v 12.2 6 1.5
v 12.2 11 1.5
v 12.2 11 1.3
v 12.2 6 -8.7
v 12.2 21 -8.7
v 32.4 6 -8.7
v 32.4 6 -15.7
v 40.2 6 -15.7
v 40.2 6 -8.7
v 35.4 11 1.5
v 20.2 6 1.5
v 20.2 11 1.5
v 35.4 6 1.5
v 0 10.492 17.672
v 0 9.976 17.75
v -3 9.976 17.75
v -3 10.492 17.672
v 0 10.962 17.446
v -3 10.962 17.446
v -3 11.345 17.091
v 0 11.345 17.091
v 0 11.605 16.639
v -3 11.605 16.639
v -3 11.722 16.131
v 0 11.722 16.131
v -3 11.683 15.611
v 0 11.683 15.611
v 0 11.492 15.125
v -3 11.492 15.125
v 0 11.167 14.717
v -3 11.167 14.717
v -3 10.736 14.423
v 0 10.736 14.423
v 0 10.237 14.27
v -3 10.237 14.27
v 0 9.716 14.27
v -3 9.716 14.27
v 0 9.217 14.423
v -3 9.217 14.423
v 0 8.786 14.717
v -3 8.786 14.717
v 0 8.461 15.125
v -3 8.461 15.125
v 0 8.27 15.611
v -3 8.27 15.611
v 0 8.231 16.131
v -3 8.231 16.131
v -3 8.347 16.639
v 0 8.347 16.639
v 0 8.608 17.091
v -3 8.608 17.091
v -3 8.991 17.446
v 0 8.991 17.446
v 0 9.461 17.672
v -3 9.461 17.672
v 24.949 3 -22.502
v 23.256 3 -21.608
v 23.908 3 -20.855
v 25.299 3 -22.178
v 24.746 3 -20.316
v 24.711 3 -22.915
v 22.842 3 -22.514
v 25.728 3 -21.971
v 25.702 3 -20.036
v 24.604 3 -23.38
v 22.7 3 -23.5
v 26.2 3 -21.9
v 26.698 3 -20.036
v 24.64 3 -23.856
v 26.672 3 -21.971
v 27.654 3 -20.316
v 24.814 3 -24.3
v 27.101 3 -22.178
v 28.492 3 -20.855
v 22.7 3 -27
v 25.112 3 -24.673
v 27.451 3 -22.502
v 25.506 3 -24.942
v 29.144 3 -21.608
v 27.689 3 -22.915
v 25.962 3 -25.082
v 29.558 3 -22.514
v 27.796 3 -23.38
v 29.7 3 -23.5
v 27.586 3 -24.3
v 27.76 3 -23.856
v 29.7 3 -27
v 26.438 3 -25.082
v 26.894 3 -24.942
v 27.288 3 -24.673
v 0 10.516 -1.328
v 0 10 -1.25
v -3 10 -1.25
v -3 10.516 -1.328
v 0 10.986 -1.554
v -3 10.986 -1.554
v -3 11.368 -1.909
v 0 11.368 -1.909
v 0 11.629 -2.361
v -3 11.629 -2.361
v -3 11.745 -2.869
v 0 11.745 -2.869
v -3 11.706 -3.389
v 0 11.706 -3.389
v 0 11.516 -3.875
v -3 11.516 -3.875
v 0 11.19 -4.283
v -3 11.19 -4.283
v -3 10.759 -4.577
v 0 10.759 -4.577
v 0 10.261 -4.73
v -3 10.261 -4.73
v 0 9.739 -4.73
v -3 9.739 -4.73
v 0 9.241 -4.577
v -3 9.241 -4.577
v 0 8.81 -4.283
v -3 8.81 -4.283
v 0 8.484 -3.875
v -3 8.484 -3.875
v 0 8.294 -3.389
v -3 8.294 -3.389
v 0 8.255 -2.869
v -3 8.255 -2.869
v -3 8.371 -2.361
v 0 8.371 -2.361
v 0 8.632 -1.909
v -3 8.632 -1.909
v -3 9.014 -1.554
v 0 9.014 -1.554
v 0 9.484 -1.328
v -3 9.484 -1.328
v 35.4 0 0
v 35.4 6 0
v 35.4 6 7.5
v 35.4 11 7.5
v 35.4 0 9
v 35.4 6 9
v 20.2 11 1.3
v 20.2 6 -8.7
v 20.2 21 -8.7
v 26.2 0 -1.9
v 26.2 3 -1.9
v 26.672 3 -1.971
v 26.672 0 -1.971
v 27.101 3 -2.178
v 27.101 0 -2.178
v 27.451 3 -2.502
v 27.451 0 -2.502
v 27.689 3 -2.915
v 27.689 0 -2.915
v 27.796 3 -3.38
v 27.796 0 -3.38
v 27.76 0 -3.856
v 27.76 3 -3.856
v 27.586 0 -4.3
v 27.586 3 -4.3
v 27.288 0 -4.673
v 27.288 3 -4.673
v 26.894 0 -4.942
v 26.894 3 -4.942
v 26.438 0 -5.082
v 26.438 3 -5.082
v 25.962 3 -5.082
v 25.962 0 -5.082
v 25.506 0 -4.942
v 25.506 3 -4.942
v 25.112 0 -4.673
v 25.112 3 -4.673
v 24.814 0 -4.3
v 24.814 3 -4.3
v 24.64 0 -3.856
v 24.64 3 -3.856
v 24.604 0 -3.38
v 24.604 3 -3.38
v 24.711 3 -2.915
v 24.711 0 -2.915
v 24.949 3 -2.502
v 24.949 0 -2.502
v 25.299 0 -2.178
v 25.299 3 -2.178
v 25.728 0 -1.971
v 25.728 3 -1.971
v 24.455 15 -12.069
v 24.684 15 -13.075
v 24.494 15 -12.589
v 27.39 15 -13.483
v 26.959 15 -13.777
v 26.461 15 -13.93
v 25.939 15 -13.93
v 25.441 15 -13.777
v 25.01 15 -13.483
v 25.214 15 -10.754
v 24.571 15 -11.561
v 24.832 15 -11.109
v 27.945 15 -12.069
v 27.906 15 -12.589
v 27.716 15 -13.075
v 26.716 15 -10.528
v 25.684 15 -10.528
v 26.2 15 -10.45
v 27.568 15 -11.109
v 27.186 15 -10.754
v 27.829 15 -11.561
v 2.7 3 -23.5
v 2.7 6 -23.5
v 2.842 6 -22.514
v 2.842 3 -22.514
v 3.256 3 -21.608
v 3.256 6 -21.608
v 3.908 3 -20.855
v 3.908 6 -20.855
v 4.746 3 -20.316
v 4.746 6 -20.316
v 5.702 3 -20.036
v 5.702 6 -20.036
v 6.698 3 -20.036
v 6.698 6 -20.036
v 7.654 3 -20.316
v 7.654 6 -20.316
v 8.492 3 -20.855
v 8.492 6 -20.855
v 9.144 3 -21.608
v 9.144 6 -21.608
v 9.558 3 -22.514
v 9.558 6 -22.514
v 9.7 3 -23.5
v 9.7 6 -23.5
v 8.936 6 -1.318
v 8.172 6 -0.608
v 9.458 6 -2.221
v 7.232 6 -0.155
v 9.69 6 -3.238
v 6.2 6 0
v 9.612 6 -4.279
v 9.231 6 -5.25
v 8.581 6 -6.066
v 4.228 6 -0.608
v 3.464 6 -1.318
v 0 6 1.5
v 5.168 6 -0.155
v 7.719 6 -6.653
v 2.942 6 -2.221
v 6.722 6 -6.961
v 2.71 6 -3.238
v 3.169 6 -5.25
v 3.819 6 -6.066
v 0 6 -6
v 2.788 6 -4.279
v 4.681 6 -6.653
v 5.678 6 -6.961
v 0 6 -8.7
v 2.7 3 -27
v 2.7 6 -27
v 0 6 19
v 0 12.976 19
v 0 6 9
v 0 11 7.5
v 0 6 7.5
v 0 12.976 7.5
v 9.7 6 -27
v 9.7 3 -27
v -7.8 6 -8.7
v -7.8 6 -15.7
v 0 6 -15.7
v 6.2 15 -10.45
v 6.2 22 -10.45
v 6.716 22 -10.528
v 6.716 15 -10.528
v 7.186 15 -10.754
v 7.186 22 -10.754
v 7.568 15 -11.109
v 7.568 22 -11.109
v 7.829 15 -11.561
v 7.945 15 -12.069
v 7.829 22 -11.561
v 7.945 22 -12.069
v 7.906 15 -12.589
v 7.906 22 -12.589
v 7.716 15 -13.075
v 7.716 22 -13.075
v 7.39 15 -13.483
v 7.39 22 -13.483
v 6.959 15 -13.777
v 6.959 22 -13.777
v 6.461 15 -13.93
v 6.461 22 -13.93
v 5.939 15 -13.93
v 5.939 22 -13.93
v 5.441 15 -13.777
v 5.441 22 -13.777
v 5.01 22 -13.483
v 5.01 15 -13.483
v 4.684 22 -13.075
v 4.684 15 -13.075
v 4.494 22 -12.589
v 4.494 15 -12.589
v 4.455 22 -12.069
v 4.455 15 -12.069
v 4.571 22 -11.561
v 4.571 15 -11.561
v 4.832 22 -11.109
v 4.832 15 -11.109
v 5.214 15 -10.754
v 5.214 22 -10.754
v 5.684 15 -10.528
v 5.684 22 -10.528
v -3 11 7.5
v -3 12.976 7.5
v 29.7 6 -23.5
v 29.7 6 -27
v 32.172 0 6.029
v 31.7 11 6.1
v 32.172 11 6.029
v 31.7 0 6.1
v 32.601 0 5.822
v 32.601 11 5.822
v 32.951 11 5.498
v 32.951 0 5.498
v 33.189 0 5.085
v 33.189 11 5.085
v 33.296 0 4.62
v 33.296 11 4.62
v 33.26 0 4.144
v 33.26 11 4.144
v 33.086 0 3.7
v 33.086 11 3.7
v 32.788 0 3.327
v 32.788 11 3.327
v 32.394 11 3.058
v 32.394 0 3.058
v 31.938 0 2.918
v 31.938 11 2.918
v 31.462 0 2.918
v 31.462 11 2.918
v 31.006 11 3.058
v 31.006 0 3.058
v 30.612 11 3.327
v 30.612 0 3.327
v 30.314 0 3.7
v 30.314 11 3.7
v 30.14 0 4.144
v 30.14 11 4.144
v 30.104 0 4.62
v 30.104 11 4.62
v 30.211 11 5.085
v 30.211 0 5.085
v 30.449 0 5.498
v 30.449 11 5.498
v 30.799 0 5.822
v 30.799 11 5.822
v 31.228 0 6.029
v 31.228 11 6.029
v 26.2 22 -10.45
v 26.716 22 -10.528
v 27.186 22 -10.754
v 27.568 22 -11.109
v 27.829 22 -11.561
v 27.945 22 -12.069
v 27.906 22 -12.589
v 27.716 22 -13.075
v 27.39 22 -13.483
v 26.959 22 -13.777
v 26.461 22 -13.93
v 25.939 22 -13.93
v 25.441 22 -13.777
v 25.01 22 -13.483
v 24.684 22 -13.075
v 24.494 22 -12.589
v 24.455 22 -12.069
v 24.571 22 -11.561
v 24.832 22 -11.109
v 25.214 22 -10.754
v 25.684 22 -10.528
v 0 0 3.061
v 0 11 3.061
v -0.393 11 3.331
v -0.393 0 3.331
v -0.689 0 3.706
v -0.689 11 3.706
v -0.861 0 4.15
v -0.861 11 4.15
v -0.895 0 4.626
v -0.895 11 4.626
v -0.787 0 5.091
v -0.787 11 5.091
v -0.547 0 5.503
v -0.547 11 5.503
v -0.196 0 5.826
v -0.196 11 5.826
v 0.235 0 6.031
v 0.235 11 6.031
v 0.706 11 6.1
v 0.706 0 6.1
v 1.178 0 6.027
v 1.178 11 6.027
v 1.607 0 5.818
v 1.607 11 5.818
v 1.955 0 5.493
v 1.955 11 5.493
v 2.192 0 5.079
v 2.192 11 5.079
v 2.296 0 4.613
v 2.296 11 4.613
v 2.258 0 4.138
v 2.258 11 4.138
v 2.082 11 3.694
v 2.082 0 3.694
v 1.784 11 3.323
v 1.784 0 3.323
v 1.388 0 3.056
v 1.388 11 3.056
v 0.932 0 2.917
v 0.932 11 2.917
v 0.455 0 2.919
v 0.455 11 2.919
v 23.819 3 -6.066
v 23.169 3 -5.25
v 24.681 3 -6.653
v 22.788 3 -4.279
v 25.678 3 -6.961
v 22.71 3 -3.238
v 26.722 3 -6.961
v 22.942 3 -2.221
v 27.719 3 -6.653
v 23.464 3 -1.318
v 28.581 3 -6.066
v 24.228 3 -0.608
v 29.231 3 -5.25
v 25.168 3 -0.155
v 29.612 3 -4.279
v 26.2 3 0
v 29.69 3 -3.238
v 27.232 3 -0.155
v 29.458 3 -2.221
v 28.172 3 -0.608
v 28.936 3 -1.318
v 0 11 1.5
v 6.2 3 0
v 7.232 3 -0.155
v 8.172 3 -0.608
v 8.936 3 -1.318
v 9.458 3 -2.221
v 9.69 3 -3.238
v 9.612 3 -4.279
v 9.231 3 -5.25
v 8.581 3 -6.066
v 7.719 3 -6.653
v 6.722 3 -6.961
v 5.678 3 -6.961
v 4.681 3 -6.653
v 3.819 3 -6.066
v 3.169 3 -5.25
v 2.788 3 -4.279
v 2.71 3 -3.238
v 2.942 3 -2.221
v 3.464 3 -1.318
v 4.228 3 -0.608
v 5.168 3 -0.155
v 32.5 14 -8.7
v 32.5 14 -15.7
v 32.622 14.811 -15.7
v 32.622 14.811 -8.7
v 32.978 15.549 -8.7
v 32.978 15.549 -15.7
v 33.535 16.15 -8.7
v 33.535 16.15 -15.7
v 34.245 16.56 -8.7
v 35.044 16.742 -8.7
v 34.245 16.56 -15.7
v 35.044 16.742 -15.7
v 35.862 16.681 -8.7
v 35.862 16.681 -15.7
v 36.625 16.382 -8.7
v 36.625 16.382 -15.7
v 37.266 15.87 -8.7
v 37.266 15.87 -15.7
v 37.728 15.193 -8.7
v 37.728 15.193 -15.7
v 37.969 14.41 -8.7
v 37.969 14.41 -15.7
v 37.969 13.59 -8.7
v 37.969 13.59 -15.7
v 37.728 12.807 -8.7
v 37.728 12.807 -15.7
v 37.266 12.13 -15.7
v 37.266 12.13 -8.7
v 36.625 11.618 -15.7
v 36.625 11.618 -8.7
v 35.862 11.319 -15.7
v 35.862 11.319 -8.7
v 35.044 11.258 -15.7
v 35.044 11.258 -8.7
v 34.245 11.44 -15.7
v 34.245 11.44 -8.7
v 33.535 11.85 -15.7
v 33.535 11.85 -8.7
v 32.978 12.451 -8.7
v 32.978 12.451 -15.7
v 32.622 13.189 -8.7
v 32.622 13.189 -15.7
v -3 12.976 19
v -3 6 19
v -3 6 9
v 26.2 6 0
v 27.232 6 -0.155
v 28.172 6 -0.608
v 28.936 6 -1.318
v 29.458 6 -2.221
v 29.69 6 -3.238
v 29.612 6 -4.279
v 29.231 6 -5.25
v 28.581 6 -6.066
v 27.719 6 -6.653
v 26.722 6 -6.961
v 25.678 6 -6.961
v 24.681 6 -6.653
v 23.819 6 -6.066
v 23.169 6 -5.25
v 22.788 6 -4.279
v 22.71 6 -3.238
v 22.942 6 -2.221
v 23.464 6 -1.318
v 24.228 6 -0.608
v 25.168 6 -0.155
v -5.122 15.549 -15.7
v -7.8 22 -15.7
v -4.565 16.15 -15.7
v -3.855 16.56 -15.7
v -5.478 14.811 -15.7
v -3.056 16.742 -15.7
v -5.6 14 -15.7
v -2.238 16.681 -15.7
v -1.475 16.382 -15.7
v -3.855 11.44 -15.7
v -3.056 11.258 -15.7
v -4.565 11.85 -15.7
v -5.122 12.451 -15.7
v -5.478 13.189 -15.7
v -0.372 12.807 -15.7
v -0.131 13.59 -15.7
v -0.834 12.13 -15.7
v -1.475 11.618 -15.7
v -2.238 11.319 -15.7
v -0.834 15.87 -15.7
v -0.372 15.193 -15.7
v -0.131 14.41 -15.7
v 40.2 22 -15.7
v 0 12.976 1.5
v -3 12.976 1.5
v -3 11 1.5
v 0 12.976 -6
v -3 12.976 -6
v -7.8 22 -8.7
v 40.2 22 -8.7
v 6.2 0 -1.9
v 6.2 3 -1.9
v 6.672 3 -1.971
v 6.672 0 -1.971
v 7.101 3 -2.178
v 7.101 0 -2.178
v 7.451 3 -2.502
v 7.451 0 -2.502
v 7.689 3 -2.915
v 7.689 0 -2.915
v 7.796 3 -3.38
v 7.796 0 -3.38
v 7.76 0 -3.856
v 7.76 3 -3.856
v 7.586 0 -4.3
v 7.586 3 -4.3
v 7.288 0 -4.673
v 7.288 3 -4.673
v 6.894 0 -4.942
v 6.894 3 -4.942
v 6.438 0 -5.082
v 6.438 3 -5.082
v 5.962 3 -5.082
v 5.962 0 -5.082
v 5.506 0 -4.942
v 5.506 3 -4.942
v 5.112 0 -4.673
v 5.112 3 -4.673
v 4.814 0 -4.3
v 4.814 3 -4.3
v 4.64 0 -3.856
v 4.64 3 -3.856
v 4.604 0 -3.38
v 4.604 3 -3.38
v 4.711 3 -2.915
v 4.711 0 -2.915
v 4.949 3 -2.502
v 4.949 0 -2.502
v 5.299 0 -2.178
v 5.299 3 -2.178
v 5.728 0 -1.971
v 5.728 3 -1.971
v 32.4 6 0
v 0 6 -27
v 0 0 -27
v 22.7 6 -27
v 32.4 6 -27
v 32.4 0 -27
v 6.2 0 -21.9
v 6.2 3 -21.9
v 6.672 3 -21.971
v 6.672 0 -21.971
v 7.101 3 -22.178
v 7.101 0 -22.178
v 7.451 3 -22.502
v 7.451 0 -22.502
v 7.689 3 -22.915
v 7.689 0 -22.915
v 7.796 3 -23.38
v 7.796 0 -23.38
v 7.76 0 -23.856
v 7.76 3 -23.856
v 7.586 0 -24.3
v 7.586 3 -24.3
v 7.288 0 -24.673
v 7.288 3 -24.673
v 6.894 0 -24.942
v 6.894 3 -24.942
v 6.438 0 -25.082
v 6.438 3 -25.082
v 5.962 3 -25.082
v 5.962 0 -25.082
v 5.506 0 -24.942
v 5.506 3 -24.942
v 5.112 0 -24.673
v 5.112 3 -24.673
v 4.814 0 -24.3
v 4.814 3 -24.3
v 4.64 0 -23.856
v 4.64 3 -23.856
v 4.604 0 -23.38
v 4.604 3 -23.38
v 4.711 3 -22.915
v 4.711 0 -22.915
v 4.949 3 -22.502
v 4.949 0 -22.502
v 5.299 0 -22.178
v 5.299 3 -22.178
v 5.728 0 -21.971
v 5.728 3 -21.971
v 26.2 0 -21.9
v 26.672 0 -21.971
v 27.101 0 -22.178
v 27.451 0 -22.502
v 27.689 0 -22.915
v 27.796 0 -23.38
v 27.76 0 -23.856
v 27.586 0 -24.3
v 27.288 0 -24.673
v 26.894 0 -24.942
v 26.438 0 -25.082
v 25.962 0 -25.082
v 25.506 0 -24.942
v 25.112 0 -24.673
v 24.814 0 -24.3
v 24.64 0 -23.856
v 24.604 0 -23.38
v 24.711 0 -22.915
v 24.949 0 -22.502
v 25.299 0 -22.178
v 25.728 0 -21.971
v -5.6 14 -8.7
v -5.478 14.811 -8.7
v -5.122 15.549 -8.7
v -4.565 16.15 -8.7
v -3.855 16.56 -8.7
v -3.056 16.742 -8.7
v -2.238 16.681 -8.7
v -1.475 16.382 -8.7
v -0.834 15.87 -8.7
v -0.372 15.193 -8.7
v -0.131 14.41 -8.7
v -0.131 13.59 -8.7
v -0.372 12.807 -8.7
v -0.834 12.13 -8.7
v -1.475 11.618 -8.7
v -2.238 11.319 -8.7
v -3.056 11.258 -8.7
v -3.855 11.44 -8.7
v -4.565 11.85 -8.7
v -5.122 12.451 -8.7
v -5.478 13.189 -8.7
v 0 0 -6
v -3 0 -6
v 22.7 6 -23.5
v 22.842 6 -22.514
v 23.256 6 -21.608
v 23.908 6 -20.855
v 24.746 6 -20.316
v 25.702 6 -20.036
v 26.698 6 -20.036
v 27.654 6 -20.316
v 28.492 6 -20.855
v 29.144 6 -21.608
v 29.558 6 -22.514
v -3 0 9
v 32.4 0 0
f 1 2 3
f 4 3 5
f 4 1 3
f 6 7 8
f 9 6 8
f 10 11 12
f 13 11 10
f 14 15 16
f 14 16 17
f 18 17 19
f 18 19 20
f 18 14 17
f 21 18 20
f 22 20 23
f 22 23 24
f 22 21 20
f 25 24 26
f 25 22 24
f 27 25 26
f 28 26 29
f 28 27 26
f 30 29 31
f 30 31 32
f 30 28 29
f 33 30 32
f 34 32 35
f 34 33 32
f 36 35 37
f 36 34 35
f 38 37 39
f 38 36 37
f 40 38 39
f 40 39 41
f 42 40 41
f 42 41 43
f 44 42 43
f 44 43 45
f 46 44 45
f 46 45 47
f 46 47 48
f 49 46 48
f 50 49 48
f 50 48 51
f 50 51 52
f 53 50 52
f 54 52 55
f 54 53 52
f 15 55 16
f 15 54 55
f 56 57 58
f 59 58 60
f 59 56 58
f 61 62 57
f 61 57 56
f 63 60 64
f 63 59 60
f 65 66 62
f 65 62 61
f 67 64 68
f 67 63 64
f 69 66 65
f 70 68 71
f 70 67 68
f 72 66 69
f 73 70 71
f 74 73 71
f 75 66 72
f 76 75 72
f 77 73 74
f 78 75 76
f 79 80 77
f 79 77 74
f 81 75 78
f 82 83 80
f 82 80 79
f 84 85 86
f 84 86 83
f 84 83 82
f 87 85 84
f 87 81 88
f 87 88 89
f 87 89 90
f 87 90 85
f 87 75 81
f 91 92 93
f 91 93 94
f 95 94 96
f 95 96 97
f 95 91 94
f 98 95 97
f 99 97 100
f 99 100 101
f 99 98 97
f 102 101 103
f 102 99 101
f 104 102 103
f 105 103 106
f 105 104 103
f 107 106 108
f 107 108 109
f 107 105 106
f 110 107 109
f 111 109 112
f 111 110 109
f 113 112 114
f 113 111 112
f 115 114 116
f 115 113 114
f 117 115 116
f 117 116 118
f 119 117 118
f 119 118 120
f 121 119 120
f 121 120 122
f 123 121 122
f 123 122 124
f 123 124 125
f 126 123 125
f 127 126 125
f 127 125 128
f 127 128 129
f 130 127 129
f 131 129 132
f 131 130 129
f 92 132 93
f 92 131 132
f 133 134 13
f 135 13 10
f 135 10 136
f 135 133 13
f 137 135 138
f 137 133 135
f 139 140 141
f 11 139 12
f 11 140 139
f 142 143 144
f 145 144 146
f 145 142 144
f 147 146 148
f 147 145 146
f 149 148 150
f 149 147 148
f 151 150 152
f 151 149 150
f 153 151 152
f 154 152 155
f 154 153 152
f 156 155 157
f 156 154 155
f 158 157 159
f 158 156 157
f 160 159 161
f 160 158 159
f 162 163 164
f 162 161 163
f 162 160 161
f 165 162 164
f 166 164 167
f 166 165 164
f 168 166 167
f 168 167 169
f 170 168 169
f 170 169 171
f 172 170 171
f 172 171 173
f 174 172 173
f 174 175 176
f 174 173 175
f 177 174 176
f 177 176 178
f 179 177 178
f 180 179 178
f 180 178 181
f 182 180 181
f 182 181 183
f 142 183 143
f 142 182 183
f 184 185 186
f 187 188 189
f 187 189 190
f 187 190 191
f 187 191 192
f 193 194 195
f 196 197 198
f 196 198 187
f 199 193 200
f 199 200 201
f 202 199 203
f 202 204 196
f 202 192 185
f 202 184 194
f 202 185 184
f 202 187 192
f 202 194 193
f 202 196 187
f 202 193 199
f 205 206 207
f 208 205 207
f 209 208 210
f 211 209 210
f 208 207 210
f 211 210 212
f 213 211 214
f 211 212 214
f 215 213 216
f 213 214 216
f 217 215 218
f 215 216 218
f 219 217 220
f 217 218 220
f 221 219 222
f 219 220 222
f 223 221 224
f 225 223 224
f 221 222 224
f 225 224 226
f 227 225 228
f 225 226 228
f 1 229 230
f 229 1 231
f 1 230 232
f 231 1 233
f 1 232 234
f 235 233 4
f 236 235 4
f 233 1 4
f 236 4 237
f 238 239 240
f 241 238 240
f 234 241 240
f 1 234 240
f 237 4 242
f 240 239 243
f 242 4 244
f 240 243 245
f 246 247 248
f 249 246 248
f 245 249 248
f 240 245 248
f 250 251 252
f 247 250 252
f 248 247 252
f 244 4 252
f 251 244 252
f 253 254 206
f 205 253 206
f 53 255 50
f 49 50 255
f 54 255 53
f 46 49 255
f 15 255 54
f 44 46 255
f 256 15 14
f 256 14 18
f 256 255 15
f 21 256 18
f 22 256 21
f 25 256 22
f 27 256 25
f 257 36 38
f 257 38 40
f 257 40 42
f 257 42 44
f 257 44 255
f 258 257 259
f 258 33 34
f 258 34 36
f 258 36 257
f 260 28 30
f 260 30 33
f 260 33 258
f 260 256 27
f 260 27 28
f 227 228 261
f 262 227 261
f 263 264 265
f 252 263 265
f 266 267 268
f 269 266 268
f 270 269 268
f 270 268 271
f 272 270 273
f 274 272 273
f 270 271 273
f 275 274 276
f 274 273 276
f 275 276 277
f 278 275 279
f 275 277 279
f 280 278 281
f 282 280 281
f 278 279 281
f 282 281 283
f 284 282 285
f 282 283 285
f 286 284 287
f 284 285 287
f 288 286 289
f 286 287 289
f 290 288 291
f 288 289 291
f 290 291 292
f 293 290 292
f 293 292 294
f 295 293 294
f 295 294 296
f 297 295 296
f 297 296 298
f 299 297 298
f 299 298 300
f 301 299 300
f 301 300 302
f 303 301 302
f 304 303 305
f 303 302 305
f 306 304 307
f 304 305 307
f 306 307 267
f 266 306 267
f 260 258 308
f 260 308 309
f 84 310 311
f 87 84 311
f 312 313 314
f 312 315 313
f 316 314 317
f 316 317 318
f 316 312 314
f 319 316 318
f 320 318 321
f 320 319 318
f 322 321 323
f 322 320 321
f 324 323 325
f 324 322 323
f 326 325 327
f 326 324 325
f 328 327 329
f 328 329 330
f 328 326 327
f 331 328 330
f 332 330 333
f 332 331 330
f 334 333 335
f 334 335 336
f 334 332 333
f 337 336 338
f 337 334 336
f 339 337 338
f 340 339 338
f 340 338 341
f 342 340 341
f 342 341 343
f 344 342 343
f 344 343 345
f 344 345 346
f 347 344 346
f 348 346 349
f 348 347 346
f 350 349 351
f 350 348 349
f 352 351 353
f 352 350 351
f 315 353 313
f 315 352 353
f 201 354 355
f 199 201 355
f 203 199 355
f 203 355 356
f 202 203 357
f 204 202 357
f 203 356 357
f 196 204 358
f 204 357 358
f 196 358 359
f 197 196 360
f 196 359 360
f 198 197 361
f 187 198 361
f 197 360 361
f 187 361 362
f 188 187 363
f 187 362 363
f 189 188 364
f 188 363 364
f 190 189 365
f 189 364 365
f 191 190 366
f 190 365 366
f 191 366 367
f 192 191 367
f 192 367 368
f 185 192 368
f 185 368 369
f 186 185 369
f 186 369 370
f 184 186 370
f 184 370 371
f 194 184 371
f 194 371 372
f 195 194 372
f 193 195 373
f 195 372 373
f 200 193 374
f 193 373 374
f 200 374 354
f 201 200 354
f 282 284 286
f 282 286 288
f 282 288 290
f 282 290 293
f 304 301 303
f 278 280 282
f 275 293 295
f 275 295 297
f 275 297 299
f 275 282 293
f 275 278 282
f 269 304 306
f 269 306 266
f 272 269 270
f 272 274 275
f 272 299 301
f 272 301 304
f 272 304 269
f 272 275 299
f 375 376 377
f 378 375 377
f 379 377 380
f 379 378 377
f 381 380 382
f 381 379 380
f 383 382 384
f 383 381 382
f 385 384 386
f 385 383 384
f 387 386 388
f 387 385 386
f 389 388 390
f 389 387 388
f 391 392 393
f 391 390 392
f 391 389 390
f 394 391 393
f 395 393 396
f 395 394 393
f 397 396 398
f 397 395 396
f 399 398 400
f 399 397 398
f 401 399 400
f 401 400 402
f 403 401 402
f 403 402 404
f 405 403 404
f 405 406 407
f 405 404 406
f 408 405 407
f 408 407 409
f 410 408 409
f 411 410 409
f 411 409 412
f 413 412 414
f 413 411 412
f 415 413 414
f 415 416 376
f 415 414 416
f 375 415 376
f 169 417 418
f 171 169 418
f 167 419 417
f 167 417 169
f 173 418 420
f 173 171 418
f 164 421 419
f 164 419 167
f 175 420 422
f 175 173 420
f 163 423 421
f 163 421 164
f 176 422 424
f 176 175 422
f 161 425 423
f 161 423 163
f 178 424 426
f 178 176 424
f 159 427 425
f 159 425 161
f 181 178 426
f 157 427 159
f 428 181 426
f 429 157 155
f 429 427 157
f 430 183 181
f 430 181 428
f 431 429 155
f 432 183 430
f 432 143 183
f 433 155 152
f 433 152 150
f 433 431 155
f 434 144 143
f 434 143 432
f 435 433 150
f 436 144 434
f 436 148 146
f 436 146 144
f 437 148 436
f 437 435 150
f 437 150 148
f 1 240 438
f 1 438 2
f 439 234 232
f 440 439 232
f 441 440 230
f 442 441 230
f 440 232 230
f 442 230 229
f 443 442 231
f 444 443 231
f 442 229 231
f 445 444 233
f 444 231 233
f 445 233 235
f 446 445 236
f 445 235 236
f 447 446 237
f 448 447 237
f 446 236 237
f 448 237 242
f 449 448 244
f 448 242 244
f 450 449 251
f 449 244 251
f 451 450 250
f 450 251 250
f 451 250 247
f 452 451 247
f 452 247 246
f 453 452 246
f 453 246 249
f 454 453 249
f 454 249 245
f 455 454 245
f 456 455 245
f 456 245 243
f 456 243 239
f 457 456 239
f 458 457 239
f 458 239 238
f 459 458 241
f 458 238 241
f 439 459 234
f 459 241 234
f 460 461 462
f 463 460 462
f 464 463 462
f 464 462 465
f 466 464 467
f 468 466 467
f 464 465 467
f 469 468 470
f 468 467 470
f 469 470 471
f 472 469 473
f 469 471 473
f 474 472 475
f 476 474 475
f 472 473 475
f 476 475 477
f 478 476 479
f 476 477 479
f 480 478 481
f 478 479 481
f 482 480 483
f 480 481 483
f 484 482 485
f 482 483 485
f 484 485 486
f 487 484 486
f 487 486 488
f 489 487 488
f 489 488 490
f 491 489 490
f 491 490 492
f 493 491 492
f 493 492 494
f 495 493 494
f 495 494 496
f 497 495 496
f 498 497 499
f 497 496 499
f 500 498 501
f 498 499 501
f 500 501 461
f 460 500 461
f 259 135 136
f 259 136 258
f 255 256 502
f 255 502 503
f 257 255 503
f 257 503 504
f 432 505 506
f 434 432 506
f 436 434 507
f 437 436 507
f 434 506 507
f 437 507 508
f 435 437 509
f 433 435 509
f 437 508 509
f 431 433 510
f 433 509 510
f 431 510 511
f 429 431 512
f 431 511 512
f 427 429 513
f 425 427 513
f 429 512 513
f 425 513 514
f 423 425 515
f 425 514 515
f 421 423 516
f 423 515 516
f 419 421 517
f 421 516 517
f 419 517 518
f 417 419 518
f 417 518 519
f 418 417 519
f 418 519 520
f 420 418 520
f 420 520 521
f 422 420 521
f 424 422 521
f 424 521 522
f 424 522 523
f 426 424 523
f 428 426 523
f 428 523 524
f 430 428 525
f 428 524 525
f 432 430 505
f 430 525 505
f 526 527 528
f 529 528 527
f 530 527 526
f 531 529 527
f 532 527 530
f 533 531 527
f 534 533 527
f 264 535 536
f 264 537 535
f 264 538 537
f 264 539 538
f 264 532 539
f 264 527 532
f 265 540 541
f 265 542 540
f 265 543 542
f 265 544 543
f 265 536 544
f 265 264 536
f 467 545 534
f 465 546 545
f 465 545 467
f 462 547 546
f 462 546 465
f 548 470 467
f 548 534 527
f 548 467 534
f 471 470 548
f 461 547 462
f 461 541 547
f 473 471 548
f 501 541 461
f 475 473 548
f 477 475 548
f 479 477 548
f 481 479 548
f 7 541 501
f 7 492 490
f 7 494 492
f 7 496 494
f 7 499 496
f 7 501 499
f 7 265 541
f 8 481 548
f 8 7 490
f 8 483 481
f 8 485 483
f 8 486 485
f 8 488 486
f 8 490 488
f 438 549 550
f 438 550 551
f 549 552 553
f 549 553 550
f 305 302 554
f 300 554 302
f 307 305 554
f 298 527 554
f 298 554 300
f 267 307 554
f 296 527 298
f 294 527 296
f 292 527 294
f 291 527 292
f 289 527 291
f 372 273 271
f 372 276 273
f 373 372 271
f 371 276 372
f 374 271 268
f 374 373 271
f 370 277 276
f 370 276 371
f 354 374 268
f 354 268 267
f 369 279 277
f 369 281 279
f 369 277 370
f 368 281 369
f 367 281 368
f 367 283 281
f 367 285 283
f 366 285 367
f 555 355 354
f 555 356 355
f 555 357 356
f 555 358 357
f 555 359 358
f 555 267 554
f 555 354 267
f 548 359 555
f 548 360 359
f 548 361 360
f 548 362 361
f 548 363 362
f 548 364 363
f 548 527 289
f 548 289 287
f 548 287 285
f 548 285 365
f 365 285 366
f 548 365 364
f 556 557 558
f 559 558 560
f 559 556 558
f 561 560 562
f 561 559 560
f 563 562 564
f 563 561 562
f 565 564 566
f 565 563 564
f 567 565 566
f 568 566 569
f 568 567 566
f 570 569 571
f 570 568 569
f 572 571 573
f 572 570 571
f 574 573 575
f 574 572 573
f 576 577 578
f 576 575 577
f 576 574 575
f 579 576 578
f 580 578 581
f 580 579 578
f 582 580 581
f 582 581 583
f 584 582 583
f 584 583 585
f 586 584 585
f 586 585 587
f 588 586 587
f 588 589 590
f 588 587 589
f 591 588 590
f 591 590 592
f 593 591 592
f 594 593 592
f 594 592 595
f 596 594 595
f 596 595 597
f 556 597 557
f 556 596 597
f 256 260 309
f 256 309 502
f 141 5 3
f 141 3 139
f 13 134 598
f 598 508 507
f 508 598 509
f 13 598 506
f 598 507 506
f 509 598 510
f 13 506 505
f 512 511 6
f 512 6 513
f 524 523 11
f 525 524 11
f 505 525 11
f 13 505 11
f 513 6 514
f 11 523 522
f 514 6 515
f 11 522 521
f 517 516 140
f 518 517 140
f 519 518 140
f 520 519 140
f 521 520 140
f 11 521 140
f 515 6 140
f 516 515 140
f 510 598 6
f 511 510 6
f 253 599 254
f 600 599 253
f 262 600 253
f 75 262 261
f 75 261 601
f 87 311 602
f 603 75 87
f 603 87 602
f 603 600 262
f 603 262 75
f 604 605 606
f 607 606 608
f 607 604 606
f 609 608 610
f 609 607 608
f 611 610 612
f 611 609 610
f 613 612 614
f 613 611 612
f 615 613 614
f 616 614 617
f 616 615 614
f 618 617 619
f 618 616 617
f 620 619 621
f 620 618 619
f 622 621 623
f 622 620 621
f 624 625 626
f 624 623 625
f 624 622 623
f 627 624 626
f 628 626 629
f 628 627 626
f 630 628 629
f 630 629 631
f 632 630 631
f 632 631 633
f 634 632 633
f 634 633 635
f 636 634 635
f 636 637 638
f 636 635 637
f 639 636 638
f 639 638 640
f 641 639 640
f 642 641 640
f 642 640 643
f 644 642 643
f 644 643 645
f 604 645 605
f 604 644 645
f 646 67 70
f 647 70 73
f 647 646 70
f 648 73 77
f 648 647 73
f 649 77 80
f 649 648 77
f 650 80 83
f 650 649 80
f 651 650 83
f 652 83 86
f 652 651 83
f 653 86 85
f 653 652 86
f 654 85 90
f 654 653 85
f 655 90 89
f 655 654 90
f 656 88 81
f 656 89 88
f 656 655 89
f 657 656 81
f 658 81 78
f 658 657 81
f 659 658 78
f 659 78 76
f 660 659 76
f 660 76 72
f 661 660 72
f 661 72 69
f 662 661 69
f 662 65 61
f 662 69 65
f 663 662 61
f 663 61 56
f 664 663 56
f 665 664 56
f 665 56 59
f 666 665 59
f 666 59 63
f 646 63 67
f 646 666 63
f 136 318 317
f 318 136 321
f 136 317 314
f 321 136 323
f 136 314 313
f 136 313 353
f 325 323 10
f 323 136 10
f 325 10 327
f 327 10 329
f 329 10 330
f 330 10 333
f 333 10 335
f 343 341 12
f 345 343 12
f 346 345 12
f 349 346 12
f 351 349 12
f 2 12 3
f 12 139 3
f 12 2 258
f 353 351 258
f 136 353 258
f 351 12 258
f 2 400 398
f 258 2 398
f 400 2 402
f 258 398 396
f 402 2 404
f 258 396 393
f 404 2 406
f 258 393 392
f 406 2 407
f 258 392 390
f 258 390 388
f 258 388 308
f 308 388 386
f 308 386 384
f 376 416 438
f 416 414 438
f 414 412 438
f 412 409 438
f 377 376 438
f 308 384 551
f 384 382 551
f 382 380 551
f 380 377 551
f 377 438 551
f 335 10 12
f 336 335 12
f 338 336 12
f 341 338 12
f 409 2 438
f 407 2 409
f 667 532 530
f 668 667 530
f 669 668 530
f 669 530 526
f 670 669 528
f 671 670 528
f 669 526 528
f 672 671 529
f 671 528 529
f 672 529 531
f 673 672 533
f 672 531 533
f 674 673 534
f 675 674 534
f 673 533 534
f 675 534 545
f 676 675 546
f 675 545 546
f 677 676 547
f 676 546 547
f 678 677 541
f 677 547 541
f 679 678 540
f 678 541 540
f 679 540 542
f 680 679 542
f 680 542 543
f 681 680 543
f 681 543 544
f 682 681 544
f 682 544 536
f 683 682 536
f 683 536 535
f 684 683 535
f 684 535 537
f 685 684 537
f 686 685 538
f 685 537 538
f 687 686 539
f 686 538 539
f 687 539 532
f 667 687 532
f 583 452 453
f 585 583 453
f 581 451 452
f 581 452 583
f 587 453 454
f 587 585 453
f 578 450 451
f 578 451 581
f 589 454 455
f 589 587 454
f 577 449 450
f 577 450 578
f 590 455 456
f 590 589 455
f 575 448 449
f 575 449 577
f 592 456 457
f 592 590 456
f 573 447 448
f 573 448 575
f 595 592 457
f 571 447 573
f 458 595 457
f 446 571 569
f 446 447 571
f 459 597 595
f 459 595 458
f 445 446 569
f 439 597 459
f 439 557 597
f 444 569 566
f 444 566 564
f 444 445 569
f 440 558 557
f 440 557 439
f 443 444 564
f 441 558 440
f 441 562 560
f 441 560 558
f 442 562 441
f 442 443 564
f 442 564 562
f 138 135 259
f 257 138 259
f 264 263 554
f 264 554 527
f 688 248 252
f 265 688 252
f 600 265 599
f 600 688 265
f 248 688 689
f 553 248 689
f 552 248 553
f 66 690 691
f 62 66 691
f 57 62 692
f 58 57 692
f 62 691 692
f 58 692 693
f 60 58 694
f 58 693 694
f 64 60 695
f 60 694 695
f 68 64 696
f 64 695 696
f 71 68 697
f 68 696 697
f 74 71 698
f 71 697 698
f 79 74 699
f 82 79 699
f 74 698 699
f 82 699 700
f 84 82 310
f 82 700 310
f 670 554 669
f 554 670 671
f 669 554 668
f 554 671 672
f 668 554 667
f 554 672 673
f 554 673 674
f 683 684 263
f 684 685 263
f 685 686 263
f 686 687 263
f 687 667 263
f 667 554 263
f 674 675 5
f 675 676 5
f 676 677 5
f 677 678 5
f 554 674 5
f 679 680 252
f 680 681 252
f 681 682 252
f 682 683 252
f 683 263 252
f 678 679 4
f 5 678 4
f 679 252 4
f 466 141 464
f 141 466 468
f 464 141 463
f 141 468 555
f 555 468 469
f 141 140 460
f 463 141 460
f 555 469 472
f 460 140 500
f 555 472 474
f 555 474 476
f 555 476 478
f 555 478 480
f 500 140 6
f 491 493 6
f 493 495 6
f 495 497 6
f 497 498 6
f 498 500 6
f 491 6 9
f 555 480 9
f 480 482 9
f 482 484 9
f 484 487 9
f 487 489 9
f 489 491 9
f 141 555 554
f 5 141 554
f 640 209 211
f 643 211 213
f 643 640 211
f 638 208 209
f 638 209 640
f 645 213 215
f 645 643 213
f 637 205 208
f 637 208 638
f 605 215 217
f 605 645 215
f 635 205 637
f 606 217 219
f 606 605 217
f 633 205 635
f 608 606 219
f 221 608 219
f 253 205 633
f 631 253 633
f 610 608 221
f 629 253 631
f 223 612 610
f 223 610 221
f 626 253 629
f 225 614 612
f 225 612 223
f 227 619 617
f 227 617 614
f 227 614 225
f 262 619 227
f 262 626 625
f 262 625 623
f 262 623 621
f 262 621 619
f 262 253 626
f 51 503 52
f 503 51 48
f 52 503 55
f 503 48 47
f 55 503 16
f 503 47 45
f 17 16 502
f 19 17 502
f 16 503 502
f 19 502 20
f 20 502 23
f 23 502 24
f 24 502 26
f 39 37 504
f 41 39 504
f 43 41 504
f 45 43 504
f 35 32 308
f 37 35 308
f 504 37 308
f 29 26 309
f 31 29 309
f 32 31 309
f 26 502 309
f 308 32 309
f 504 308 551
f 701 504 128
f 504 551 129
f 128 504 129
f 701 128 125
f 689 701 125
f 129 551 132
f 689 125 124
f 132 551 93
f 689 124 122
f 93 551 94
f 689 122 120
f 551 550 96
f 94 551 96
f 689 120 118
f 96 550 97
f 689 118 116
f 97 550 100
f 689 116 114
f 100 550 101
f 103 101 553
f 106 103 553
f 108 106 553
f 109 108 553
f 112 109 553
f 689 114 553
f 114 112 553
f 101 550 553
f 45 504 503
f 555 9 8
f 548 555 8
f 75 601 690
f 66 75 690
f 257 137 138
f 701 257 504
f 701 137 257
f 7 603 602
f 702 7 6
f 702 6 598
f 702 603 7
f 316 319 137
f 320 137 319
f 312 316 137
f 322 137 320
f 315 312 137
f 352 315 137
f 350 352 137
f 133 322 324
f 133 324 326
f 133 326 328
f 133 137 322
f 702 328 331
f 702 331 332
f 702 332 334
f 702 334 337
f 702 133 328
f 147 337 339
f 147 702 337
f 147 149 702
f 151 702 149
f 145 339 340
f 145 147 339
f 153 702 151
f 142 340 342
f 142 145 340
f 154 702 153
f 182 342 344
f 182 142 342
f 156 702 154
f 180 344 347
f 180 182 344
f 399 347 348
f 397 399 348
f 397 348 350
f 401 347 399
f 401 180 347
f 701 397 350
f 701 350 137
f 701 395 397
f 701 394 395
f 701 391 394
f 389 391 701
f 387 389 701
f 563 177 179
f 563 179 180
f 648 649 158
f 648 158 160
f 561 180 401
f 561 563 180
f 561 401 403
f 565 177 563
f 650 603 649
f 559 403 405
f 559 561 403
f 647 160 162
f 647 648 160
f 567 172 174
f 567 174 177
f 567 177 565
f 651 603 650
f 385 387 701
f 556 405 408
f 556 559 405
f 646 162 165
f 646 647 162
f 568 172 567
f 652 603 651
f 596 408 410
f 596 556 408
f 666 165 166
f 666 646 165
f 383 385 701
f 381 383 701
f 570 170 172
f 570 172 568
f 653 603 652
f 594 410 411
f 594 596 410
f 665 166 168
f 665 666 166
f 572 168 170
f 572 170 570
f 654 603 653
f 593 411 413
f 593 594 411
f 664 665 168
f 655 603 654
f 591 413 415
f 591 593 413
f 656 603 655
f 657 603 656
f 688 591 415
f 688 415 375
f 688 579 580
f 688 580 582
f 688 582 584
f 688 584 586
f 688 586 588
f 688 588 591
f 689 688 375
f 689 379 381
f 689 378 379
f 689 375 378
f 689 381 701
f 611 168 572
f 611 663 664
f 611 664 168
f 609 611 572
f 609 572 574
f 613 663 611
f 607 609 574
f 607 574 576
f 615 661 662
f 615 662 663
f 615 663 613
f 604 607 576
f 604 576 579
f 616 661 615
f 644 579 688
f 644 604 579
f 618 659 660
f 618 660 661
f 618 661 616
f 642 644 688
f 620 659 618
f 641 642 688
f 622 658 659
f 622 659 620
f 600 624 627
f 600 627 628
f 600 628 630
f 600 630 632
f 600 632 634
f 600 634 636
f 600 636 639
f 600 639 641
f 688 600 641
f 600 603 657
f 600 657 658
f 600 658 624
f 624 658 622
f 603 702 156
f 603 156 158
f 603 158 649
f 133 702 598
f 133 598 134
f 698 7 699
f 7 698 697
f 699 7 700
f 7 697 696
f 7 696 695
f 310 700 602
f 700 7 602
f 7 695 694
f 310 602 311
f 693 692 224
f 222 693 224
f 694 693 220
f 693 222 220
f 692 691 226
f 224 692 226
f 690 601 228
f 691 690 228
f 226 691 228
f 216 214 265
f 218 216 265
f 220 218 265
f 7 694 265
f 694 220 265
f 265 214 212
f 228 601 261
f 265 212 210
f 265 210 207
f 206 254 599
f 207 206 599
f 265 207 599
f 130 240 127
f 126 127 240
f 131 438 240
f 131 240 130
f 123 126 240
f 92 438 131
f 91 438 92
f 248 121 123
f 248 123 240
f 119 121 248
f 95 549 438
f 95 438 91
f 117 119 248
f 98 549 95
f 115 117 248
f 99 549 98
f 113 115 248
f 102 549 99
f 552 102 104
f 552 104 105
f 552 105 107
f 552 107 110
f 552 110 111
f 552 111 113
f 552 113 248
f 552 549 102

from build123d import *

# Parameters (mm, degrees)
SKETCH_1_R          = 1.6
EXTRUDE_1_DEPTH     = 6
SKETCH_2_R          = 3.5
CUT_EXTRUDE_1_DEPTH = 3
SKETCH_3_W          = 48
SKETCH_3_H          = 7
EXTRUDE_2_DEPTH     = 16
SKETCH_5_R          = 2.75
CUT_EXTRUDE_2_DEPTH = 7
SKETCH_6_R          = 1.6
EXTRUDE_3_DEPTH     = 5
SKETCH_7_R          = 1.75
EXTRUDE_4_DEPTH     = 3
CHAMFER_1_SIZE      = 10
CUT_EXTRUDE_START   = -11
SKETCH_8_R          = 1.6
CUT_EXTRUDE_3_DEPTH = 11
SKETCH_9_R          = 1.75
CUT_EXTRUDE_4_DEPTH = 7


with BuildPart() as part:
    # Эскиз1 → Бобышка-Вытянуть1 (new body)
    with BuildSketch(Plane(origin=(0, 0, 0), x_dir=(1, 0, 0), z_dir=(0, 1, 0))):
        Polygon((0, 0), (0, 27), (32.4, 27), (32.4, 0), (35.4, 0), (35.4, -9), (-3, -9), (-3, 0), align=None)
        with Locations(Location((6.2, 23.5, 0), (0, 0, 270))):
            Circle(SKETCH_1_R, mode=Mode.SUBTRACT)
        with Locations(Location((26.2, 23.5, 0), (0, 0, 270))):
            Circle(SKETCH_1_R, mode=Mode.SUBTRACT)
        with Locations(Location((6.2, 3.5, 0), (0, 0, 270))):
            Circle(SKETCH_1_R, mode=Mode.SUBTRACT)
        with Locations(Location((26.2, 3.5, 0), (0, 0, 270))):
            Circle(SKETCH_1_R, mode=Mode.SUBTRACT)
        with Locations(Location((31.7, -4.5, 0), (0, 0, 270))):
            Circle(SKETCH_1_R, mode=Mode.SUBTRACT)
        with Locations(Location((0.7, -4.5, 0), (0, 0, 270))):
            Circle(SKETCH_1_R, mode=Mode.SUBTRACT)
    extrude(amount=EXTRUDE_1_DEPTH)

    # Эскиз2 → Вырез-Вытянуть1 (cut)
    with BuildSketch(Plane(origin=(0, 6, 0), x_dir=(1, 0, 0), z_dir=(0, 1, 0))):
        with Locations(Location((26.2, 3.5, 0), (0, 0, 270))):
            Circle(SKETCH_2_R)
        with Locations(Location((6.2, 3.5, 0), (0, 0, 270))):
            Circle(SKETCH_2_R)
        with BuildLine():
            Line((29.7, 23.5), (29.7, 27))
            Line((29.7, 27), (22.7, 27))
            Line((22.7, 27), (22.7, 23.5))
            ThreePointArc((22.7, 23.5), (26.2, 20), (29.7, 23.5))
        make_face()
        with BuildLine():
            Line((9.7, 23.5), (9.7, 27))
            Line((9.7, 27), (2.7, 27))
            Line((2.7, 27), (2.7, 23.5))
            ThreePointArc((2.7, 23.5), (6.2, 20), (9.7, 23.5))
        make_face()
    extrude(amount=-CUT_EXTRUDE_1_DEPTH, mode=Mode.SUBTRACT)

    # Эскиз3 → Бобышка-Вытянуть2 (add)
    with BuildSketch(Plane(origin=(0, 6, 0), x_dir=(1, 0, 0), z_dir=(0, 1, 0))):
        with Locations((16.2, 12.2)):
            Rectangle(SKETCH_3_W, SKETCH_3_H)
    extrude(amount=EXTRUDE_2_DEPTH)

    # Эскиз5 → Вырез-Вытянуть2 (cut)
    with BuildSketch(Plane(origin=(0, 0, -15.7), x_dir=(-1, 0, 0), z_dir=(0, 0, -1))):
        with Locations((-35.25, 14)):
            Circle(SKETCH_5_R)
        with Locations((2.85, 14)):
            Circle(SKETCH_5_R)
    extrude(amount=-CUT_EXTRUDE_2_DEPTH, mode=Mode.SUBTRACT)

    # Эскиз6 → Бобышка-Вытянуть3 (add)
    with BuildSketch(Plane(origin=(0, 6, 0), x_dir=(1, 0, 0), z_dir=(0, 1, 0))):
        Polygon((35.4, -7.5), (-3, -7.5), (-3, -1.5), (12.2, -1.5), (12.2, 8.7), (20.2, 8.7), (20.2, -1.5), (35.4, -1.5), align=None)
        with Locations(Location((31.7, -4.5, 0), (0, 0, 270))):
            Circle(SKETCH_6_R, mode=Mode.SUBTRACT)
        with Locations(Location((0.7, -4.5, 0), (0, 0, 270))):
            Circle(SKETCH_6_R, mode=Mode.SUBTRACT)
    extrude(amount=EXTRUDE_3_DEPTH)

    # Эскиз7 → Бобышка-Вытянуть4 (add)
    with BuildSketch(Plane.ZY):
        Polygon((7.5, 12.97640534), (18.99998535, 12.97640534), (18.99998535, 6), (9, 6), (9, 0), (-6, 0), (-6, 12.97640534), (1.5, 12.97640534), (1.5, 11), (7.5, 11), align=None)
        with Locations((-3, 10)):
            Circle(SKETCH_7_R, mode=Mode.SUBTRACT)
        with Locations((15.99998535, 9.97640534)):
            Circle(SKETCH_7_R, mode=Mode.SUBTRACT)
    extrude(amount=EXTRUDE_4_DEPTH)

    # Фаска1
    chamfer_1_edges = [part.edges().sort_by_distance(p)[0] for p in [
        (16.2, 11, -8.7),
    ]]
    chamfer(chamfer_1_edges, length=CHAMFER_1_SIZE)

    # Эскиз8 → Вырез-Вытянуть3 (cut)
    with BuildSketch(Plane(origin=(0, 11, 0), x_dir=(1, 0, 0), z_dir=(0, 1, 0)).offset(CUT_EXTRUDE_START)):
        with Locations(Location((0.7, -4.5, 0), (0, 0, 270))):
            Circle(SKETCH_8_R)
    extrude(amount=CUT_EXTRUDE_3_DEPTH, mode=Mode.SUBTRACT)

    # Эскиз9 → Вырез-Вытянуть4 (cut)
    with BuildSketch(Plane(origin=(0, 22, 0), x_dir=(1, 0, 0), z_dir=(0, 1, 0))):
        with Locations(Location((26.2, 12.2, 0), (0, 0, 270))):
            Circle(SKETCH_9_R)
        with Locations(Location((6.2, 12.2, 0), (0, 0, 270))):
            Circle(SKETCH_9_R)
    extrude(amount=-CUT_EXTRUDE_4_DEPTH, mode=Mode.SUBTRACT)


solid = part.part
